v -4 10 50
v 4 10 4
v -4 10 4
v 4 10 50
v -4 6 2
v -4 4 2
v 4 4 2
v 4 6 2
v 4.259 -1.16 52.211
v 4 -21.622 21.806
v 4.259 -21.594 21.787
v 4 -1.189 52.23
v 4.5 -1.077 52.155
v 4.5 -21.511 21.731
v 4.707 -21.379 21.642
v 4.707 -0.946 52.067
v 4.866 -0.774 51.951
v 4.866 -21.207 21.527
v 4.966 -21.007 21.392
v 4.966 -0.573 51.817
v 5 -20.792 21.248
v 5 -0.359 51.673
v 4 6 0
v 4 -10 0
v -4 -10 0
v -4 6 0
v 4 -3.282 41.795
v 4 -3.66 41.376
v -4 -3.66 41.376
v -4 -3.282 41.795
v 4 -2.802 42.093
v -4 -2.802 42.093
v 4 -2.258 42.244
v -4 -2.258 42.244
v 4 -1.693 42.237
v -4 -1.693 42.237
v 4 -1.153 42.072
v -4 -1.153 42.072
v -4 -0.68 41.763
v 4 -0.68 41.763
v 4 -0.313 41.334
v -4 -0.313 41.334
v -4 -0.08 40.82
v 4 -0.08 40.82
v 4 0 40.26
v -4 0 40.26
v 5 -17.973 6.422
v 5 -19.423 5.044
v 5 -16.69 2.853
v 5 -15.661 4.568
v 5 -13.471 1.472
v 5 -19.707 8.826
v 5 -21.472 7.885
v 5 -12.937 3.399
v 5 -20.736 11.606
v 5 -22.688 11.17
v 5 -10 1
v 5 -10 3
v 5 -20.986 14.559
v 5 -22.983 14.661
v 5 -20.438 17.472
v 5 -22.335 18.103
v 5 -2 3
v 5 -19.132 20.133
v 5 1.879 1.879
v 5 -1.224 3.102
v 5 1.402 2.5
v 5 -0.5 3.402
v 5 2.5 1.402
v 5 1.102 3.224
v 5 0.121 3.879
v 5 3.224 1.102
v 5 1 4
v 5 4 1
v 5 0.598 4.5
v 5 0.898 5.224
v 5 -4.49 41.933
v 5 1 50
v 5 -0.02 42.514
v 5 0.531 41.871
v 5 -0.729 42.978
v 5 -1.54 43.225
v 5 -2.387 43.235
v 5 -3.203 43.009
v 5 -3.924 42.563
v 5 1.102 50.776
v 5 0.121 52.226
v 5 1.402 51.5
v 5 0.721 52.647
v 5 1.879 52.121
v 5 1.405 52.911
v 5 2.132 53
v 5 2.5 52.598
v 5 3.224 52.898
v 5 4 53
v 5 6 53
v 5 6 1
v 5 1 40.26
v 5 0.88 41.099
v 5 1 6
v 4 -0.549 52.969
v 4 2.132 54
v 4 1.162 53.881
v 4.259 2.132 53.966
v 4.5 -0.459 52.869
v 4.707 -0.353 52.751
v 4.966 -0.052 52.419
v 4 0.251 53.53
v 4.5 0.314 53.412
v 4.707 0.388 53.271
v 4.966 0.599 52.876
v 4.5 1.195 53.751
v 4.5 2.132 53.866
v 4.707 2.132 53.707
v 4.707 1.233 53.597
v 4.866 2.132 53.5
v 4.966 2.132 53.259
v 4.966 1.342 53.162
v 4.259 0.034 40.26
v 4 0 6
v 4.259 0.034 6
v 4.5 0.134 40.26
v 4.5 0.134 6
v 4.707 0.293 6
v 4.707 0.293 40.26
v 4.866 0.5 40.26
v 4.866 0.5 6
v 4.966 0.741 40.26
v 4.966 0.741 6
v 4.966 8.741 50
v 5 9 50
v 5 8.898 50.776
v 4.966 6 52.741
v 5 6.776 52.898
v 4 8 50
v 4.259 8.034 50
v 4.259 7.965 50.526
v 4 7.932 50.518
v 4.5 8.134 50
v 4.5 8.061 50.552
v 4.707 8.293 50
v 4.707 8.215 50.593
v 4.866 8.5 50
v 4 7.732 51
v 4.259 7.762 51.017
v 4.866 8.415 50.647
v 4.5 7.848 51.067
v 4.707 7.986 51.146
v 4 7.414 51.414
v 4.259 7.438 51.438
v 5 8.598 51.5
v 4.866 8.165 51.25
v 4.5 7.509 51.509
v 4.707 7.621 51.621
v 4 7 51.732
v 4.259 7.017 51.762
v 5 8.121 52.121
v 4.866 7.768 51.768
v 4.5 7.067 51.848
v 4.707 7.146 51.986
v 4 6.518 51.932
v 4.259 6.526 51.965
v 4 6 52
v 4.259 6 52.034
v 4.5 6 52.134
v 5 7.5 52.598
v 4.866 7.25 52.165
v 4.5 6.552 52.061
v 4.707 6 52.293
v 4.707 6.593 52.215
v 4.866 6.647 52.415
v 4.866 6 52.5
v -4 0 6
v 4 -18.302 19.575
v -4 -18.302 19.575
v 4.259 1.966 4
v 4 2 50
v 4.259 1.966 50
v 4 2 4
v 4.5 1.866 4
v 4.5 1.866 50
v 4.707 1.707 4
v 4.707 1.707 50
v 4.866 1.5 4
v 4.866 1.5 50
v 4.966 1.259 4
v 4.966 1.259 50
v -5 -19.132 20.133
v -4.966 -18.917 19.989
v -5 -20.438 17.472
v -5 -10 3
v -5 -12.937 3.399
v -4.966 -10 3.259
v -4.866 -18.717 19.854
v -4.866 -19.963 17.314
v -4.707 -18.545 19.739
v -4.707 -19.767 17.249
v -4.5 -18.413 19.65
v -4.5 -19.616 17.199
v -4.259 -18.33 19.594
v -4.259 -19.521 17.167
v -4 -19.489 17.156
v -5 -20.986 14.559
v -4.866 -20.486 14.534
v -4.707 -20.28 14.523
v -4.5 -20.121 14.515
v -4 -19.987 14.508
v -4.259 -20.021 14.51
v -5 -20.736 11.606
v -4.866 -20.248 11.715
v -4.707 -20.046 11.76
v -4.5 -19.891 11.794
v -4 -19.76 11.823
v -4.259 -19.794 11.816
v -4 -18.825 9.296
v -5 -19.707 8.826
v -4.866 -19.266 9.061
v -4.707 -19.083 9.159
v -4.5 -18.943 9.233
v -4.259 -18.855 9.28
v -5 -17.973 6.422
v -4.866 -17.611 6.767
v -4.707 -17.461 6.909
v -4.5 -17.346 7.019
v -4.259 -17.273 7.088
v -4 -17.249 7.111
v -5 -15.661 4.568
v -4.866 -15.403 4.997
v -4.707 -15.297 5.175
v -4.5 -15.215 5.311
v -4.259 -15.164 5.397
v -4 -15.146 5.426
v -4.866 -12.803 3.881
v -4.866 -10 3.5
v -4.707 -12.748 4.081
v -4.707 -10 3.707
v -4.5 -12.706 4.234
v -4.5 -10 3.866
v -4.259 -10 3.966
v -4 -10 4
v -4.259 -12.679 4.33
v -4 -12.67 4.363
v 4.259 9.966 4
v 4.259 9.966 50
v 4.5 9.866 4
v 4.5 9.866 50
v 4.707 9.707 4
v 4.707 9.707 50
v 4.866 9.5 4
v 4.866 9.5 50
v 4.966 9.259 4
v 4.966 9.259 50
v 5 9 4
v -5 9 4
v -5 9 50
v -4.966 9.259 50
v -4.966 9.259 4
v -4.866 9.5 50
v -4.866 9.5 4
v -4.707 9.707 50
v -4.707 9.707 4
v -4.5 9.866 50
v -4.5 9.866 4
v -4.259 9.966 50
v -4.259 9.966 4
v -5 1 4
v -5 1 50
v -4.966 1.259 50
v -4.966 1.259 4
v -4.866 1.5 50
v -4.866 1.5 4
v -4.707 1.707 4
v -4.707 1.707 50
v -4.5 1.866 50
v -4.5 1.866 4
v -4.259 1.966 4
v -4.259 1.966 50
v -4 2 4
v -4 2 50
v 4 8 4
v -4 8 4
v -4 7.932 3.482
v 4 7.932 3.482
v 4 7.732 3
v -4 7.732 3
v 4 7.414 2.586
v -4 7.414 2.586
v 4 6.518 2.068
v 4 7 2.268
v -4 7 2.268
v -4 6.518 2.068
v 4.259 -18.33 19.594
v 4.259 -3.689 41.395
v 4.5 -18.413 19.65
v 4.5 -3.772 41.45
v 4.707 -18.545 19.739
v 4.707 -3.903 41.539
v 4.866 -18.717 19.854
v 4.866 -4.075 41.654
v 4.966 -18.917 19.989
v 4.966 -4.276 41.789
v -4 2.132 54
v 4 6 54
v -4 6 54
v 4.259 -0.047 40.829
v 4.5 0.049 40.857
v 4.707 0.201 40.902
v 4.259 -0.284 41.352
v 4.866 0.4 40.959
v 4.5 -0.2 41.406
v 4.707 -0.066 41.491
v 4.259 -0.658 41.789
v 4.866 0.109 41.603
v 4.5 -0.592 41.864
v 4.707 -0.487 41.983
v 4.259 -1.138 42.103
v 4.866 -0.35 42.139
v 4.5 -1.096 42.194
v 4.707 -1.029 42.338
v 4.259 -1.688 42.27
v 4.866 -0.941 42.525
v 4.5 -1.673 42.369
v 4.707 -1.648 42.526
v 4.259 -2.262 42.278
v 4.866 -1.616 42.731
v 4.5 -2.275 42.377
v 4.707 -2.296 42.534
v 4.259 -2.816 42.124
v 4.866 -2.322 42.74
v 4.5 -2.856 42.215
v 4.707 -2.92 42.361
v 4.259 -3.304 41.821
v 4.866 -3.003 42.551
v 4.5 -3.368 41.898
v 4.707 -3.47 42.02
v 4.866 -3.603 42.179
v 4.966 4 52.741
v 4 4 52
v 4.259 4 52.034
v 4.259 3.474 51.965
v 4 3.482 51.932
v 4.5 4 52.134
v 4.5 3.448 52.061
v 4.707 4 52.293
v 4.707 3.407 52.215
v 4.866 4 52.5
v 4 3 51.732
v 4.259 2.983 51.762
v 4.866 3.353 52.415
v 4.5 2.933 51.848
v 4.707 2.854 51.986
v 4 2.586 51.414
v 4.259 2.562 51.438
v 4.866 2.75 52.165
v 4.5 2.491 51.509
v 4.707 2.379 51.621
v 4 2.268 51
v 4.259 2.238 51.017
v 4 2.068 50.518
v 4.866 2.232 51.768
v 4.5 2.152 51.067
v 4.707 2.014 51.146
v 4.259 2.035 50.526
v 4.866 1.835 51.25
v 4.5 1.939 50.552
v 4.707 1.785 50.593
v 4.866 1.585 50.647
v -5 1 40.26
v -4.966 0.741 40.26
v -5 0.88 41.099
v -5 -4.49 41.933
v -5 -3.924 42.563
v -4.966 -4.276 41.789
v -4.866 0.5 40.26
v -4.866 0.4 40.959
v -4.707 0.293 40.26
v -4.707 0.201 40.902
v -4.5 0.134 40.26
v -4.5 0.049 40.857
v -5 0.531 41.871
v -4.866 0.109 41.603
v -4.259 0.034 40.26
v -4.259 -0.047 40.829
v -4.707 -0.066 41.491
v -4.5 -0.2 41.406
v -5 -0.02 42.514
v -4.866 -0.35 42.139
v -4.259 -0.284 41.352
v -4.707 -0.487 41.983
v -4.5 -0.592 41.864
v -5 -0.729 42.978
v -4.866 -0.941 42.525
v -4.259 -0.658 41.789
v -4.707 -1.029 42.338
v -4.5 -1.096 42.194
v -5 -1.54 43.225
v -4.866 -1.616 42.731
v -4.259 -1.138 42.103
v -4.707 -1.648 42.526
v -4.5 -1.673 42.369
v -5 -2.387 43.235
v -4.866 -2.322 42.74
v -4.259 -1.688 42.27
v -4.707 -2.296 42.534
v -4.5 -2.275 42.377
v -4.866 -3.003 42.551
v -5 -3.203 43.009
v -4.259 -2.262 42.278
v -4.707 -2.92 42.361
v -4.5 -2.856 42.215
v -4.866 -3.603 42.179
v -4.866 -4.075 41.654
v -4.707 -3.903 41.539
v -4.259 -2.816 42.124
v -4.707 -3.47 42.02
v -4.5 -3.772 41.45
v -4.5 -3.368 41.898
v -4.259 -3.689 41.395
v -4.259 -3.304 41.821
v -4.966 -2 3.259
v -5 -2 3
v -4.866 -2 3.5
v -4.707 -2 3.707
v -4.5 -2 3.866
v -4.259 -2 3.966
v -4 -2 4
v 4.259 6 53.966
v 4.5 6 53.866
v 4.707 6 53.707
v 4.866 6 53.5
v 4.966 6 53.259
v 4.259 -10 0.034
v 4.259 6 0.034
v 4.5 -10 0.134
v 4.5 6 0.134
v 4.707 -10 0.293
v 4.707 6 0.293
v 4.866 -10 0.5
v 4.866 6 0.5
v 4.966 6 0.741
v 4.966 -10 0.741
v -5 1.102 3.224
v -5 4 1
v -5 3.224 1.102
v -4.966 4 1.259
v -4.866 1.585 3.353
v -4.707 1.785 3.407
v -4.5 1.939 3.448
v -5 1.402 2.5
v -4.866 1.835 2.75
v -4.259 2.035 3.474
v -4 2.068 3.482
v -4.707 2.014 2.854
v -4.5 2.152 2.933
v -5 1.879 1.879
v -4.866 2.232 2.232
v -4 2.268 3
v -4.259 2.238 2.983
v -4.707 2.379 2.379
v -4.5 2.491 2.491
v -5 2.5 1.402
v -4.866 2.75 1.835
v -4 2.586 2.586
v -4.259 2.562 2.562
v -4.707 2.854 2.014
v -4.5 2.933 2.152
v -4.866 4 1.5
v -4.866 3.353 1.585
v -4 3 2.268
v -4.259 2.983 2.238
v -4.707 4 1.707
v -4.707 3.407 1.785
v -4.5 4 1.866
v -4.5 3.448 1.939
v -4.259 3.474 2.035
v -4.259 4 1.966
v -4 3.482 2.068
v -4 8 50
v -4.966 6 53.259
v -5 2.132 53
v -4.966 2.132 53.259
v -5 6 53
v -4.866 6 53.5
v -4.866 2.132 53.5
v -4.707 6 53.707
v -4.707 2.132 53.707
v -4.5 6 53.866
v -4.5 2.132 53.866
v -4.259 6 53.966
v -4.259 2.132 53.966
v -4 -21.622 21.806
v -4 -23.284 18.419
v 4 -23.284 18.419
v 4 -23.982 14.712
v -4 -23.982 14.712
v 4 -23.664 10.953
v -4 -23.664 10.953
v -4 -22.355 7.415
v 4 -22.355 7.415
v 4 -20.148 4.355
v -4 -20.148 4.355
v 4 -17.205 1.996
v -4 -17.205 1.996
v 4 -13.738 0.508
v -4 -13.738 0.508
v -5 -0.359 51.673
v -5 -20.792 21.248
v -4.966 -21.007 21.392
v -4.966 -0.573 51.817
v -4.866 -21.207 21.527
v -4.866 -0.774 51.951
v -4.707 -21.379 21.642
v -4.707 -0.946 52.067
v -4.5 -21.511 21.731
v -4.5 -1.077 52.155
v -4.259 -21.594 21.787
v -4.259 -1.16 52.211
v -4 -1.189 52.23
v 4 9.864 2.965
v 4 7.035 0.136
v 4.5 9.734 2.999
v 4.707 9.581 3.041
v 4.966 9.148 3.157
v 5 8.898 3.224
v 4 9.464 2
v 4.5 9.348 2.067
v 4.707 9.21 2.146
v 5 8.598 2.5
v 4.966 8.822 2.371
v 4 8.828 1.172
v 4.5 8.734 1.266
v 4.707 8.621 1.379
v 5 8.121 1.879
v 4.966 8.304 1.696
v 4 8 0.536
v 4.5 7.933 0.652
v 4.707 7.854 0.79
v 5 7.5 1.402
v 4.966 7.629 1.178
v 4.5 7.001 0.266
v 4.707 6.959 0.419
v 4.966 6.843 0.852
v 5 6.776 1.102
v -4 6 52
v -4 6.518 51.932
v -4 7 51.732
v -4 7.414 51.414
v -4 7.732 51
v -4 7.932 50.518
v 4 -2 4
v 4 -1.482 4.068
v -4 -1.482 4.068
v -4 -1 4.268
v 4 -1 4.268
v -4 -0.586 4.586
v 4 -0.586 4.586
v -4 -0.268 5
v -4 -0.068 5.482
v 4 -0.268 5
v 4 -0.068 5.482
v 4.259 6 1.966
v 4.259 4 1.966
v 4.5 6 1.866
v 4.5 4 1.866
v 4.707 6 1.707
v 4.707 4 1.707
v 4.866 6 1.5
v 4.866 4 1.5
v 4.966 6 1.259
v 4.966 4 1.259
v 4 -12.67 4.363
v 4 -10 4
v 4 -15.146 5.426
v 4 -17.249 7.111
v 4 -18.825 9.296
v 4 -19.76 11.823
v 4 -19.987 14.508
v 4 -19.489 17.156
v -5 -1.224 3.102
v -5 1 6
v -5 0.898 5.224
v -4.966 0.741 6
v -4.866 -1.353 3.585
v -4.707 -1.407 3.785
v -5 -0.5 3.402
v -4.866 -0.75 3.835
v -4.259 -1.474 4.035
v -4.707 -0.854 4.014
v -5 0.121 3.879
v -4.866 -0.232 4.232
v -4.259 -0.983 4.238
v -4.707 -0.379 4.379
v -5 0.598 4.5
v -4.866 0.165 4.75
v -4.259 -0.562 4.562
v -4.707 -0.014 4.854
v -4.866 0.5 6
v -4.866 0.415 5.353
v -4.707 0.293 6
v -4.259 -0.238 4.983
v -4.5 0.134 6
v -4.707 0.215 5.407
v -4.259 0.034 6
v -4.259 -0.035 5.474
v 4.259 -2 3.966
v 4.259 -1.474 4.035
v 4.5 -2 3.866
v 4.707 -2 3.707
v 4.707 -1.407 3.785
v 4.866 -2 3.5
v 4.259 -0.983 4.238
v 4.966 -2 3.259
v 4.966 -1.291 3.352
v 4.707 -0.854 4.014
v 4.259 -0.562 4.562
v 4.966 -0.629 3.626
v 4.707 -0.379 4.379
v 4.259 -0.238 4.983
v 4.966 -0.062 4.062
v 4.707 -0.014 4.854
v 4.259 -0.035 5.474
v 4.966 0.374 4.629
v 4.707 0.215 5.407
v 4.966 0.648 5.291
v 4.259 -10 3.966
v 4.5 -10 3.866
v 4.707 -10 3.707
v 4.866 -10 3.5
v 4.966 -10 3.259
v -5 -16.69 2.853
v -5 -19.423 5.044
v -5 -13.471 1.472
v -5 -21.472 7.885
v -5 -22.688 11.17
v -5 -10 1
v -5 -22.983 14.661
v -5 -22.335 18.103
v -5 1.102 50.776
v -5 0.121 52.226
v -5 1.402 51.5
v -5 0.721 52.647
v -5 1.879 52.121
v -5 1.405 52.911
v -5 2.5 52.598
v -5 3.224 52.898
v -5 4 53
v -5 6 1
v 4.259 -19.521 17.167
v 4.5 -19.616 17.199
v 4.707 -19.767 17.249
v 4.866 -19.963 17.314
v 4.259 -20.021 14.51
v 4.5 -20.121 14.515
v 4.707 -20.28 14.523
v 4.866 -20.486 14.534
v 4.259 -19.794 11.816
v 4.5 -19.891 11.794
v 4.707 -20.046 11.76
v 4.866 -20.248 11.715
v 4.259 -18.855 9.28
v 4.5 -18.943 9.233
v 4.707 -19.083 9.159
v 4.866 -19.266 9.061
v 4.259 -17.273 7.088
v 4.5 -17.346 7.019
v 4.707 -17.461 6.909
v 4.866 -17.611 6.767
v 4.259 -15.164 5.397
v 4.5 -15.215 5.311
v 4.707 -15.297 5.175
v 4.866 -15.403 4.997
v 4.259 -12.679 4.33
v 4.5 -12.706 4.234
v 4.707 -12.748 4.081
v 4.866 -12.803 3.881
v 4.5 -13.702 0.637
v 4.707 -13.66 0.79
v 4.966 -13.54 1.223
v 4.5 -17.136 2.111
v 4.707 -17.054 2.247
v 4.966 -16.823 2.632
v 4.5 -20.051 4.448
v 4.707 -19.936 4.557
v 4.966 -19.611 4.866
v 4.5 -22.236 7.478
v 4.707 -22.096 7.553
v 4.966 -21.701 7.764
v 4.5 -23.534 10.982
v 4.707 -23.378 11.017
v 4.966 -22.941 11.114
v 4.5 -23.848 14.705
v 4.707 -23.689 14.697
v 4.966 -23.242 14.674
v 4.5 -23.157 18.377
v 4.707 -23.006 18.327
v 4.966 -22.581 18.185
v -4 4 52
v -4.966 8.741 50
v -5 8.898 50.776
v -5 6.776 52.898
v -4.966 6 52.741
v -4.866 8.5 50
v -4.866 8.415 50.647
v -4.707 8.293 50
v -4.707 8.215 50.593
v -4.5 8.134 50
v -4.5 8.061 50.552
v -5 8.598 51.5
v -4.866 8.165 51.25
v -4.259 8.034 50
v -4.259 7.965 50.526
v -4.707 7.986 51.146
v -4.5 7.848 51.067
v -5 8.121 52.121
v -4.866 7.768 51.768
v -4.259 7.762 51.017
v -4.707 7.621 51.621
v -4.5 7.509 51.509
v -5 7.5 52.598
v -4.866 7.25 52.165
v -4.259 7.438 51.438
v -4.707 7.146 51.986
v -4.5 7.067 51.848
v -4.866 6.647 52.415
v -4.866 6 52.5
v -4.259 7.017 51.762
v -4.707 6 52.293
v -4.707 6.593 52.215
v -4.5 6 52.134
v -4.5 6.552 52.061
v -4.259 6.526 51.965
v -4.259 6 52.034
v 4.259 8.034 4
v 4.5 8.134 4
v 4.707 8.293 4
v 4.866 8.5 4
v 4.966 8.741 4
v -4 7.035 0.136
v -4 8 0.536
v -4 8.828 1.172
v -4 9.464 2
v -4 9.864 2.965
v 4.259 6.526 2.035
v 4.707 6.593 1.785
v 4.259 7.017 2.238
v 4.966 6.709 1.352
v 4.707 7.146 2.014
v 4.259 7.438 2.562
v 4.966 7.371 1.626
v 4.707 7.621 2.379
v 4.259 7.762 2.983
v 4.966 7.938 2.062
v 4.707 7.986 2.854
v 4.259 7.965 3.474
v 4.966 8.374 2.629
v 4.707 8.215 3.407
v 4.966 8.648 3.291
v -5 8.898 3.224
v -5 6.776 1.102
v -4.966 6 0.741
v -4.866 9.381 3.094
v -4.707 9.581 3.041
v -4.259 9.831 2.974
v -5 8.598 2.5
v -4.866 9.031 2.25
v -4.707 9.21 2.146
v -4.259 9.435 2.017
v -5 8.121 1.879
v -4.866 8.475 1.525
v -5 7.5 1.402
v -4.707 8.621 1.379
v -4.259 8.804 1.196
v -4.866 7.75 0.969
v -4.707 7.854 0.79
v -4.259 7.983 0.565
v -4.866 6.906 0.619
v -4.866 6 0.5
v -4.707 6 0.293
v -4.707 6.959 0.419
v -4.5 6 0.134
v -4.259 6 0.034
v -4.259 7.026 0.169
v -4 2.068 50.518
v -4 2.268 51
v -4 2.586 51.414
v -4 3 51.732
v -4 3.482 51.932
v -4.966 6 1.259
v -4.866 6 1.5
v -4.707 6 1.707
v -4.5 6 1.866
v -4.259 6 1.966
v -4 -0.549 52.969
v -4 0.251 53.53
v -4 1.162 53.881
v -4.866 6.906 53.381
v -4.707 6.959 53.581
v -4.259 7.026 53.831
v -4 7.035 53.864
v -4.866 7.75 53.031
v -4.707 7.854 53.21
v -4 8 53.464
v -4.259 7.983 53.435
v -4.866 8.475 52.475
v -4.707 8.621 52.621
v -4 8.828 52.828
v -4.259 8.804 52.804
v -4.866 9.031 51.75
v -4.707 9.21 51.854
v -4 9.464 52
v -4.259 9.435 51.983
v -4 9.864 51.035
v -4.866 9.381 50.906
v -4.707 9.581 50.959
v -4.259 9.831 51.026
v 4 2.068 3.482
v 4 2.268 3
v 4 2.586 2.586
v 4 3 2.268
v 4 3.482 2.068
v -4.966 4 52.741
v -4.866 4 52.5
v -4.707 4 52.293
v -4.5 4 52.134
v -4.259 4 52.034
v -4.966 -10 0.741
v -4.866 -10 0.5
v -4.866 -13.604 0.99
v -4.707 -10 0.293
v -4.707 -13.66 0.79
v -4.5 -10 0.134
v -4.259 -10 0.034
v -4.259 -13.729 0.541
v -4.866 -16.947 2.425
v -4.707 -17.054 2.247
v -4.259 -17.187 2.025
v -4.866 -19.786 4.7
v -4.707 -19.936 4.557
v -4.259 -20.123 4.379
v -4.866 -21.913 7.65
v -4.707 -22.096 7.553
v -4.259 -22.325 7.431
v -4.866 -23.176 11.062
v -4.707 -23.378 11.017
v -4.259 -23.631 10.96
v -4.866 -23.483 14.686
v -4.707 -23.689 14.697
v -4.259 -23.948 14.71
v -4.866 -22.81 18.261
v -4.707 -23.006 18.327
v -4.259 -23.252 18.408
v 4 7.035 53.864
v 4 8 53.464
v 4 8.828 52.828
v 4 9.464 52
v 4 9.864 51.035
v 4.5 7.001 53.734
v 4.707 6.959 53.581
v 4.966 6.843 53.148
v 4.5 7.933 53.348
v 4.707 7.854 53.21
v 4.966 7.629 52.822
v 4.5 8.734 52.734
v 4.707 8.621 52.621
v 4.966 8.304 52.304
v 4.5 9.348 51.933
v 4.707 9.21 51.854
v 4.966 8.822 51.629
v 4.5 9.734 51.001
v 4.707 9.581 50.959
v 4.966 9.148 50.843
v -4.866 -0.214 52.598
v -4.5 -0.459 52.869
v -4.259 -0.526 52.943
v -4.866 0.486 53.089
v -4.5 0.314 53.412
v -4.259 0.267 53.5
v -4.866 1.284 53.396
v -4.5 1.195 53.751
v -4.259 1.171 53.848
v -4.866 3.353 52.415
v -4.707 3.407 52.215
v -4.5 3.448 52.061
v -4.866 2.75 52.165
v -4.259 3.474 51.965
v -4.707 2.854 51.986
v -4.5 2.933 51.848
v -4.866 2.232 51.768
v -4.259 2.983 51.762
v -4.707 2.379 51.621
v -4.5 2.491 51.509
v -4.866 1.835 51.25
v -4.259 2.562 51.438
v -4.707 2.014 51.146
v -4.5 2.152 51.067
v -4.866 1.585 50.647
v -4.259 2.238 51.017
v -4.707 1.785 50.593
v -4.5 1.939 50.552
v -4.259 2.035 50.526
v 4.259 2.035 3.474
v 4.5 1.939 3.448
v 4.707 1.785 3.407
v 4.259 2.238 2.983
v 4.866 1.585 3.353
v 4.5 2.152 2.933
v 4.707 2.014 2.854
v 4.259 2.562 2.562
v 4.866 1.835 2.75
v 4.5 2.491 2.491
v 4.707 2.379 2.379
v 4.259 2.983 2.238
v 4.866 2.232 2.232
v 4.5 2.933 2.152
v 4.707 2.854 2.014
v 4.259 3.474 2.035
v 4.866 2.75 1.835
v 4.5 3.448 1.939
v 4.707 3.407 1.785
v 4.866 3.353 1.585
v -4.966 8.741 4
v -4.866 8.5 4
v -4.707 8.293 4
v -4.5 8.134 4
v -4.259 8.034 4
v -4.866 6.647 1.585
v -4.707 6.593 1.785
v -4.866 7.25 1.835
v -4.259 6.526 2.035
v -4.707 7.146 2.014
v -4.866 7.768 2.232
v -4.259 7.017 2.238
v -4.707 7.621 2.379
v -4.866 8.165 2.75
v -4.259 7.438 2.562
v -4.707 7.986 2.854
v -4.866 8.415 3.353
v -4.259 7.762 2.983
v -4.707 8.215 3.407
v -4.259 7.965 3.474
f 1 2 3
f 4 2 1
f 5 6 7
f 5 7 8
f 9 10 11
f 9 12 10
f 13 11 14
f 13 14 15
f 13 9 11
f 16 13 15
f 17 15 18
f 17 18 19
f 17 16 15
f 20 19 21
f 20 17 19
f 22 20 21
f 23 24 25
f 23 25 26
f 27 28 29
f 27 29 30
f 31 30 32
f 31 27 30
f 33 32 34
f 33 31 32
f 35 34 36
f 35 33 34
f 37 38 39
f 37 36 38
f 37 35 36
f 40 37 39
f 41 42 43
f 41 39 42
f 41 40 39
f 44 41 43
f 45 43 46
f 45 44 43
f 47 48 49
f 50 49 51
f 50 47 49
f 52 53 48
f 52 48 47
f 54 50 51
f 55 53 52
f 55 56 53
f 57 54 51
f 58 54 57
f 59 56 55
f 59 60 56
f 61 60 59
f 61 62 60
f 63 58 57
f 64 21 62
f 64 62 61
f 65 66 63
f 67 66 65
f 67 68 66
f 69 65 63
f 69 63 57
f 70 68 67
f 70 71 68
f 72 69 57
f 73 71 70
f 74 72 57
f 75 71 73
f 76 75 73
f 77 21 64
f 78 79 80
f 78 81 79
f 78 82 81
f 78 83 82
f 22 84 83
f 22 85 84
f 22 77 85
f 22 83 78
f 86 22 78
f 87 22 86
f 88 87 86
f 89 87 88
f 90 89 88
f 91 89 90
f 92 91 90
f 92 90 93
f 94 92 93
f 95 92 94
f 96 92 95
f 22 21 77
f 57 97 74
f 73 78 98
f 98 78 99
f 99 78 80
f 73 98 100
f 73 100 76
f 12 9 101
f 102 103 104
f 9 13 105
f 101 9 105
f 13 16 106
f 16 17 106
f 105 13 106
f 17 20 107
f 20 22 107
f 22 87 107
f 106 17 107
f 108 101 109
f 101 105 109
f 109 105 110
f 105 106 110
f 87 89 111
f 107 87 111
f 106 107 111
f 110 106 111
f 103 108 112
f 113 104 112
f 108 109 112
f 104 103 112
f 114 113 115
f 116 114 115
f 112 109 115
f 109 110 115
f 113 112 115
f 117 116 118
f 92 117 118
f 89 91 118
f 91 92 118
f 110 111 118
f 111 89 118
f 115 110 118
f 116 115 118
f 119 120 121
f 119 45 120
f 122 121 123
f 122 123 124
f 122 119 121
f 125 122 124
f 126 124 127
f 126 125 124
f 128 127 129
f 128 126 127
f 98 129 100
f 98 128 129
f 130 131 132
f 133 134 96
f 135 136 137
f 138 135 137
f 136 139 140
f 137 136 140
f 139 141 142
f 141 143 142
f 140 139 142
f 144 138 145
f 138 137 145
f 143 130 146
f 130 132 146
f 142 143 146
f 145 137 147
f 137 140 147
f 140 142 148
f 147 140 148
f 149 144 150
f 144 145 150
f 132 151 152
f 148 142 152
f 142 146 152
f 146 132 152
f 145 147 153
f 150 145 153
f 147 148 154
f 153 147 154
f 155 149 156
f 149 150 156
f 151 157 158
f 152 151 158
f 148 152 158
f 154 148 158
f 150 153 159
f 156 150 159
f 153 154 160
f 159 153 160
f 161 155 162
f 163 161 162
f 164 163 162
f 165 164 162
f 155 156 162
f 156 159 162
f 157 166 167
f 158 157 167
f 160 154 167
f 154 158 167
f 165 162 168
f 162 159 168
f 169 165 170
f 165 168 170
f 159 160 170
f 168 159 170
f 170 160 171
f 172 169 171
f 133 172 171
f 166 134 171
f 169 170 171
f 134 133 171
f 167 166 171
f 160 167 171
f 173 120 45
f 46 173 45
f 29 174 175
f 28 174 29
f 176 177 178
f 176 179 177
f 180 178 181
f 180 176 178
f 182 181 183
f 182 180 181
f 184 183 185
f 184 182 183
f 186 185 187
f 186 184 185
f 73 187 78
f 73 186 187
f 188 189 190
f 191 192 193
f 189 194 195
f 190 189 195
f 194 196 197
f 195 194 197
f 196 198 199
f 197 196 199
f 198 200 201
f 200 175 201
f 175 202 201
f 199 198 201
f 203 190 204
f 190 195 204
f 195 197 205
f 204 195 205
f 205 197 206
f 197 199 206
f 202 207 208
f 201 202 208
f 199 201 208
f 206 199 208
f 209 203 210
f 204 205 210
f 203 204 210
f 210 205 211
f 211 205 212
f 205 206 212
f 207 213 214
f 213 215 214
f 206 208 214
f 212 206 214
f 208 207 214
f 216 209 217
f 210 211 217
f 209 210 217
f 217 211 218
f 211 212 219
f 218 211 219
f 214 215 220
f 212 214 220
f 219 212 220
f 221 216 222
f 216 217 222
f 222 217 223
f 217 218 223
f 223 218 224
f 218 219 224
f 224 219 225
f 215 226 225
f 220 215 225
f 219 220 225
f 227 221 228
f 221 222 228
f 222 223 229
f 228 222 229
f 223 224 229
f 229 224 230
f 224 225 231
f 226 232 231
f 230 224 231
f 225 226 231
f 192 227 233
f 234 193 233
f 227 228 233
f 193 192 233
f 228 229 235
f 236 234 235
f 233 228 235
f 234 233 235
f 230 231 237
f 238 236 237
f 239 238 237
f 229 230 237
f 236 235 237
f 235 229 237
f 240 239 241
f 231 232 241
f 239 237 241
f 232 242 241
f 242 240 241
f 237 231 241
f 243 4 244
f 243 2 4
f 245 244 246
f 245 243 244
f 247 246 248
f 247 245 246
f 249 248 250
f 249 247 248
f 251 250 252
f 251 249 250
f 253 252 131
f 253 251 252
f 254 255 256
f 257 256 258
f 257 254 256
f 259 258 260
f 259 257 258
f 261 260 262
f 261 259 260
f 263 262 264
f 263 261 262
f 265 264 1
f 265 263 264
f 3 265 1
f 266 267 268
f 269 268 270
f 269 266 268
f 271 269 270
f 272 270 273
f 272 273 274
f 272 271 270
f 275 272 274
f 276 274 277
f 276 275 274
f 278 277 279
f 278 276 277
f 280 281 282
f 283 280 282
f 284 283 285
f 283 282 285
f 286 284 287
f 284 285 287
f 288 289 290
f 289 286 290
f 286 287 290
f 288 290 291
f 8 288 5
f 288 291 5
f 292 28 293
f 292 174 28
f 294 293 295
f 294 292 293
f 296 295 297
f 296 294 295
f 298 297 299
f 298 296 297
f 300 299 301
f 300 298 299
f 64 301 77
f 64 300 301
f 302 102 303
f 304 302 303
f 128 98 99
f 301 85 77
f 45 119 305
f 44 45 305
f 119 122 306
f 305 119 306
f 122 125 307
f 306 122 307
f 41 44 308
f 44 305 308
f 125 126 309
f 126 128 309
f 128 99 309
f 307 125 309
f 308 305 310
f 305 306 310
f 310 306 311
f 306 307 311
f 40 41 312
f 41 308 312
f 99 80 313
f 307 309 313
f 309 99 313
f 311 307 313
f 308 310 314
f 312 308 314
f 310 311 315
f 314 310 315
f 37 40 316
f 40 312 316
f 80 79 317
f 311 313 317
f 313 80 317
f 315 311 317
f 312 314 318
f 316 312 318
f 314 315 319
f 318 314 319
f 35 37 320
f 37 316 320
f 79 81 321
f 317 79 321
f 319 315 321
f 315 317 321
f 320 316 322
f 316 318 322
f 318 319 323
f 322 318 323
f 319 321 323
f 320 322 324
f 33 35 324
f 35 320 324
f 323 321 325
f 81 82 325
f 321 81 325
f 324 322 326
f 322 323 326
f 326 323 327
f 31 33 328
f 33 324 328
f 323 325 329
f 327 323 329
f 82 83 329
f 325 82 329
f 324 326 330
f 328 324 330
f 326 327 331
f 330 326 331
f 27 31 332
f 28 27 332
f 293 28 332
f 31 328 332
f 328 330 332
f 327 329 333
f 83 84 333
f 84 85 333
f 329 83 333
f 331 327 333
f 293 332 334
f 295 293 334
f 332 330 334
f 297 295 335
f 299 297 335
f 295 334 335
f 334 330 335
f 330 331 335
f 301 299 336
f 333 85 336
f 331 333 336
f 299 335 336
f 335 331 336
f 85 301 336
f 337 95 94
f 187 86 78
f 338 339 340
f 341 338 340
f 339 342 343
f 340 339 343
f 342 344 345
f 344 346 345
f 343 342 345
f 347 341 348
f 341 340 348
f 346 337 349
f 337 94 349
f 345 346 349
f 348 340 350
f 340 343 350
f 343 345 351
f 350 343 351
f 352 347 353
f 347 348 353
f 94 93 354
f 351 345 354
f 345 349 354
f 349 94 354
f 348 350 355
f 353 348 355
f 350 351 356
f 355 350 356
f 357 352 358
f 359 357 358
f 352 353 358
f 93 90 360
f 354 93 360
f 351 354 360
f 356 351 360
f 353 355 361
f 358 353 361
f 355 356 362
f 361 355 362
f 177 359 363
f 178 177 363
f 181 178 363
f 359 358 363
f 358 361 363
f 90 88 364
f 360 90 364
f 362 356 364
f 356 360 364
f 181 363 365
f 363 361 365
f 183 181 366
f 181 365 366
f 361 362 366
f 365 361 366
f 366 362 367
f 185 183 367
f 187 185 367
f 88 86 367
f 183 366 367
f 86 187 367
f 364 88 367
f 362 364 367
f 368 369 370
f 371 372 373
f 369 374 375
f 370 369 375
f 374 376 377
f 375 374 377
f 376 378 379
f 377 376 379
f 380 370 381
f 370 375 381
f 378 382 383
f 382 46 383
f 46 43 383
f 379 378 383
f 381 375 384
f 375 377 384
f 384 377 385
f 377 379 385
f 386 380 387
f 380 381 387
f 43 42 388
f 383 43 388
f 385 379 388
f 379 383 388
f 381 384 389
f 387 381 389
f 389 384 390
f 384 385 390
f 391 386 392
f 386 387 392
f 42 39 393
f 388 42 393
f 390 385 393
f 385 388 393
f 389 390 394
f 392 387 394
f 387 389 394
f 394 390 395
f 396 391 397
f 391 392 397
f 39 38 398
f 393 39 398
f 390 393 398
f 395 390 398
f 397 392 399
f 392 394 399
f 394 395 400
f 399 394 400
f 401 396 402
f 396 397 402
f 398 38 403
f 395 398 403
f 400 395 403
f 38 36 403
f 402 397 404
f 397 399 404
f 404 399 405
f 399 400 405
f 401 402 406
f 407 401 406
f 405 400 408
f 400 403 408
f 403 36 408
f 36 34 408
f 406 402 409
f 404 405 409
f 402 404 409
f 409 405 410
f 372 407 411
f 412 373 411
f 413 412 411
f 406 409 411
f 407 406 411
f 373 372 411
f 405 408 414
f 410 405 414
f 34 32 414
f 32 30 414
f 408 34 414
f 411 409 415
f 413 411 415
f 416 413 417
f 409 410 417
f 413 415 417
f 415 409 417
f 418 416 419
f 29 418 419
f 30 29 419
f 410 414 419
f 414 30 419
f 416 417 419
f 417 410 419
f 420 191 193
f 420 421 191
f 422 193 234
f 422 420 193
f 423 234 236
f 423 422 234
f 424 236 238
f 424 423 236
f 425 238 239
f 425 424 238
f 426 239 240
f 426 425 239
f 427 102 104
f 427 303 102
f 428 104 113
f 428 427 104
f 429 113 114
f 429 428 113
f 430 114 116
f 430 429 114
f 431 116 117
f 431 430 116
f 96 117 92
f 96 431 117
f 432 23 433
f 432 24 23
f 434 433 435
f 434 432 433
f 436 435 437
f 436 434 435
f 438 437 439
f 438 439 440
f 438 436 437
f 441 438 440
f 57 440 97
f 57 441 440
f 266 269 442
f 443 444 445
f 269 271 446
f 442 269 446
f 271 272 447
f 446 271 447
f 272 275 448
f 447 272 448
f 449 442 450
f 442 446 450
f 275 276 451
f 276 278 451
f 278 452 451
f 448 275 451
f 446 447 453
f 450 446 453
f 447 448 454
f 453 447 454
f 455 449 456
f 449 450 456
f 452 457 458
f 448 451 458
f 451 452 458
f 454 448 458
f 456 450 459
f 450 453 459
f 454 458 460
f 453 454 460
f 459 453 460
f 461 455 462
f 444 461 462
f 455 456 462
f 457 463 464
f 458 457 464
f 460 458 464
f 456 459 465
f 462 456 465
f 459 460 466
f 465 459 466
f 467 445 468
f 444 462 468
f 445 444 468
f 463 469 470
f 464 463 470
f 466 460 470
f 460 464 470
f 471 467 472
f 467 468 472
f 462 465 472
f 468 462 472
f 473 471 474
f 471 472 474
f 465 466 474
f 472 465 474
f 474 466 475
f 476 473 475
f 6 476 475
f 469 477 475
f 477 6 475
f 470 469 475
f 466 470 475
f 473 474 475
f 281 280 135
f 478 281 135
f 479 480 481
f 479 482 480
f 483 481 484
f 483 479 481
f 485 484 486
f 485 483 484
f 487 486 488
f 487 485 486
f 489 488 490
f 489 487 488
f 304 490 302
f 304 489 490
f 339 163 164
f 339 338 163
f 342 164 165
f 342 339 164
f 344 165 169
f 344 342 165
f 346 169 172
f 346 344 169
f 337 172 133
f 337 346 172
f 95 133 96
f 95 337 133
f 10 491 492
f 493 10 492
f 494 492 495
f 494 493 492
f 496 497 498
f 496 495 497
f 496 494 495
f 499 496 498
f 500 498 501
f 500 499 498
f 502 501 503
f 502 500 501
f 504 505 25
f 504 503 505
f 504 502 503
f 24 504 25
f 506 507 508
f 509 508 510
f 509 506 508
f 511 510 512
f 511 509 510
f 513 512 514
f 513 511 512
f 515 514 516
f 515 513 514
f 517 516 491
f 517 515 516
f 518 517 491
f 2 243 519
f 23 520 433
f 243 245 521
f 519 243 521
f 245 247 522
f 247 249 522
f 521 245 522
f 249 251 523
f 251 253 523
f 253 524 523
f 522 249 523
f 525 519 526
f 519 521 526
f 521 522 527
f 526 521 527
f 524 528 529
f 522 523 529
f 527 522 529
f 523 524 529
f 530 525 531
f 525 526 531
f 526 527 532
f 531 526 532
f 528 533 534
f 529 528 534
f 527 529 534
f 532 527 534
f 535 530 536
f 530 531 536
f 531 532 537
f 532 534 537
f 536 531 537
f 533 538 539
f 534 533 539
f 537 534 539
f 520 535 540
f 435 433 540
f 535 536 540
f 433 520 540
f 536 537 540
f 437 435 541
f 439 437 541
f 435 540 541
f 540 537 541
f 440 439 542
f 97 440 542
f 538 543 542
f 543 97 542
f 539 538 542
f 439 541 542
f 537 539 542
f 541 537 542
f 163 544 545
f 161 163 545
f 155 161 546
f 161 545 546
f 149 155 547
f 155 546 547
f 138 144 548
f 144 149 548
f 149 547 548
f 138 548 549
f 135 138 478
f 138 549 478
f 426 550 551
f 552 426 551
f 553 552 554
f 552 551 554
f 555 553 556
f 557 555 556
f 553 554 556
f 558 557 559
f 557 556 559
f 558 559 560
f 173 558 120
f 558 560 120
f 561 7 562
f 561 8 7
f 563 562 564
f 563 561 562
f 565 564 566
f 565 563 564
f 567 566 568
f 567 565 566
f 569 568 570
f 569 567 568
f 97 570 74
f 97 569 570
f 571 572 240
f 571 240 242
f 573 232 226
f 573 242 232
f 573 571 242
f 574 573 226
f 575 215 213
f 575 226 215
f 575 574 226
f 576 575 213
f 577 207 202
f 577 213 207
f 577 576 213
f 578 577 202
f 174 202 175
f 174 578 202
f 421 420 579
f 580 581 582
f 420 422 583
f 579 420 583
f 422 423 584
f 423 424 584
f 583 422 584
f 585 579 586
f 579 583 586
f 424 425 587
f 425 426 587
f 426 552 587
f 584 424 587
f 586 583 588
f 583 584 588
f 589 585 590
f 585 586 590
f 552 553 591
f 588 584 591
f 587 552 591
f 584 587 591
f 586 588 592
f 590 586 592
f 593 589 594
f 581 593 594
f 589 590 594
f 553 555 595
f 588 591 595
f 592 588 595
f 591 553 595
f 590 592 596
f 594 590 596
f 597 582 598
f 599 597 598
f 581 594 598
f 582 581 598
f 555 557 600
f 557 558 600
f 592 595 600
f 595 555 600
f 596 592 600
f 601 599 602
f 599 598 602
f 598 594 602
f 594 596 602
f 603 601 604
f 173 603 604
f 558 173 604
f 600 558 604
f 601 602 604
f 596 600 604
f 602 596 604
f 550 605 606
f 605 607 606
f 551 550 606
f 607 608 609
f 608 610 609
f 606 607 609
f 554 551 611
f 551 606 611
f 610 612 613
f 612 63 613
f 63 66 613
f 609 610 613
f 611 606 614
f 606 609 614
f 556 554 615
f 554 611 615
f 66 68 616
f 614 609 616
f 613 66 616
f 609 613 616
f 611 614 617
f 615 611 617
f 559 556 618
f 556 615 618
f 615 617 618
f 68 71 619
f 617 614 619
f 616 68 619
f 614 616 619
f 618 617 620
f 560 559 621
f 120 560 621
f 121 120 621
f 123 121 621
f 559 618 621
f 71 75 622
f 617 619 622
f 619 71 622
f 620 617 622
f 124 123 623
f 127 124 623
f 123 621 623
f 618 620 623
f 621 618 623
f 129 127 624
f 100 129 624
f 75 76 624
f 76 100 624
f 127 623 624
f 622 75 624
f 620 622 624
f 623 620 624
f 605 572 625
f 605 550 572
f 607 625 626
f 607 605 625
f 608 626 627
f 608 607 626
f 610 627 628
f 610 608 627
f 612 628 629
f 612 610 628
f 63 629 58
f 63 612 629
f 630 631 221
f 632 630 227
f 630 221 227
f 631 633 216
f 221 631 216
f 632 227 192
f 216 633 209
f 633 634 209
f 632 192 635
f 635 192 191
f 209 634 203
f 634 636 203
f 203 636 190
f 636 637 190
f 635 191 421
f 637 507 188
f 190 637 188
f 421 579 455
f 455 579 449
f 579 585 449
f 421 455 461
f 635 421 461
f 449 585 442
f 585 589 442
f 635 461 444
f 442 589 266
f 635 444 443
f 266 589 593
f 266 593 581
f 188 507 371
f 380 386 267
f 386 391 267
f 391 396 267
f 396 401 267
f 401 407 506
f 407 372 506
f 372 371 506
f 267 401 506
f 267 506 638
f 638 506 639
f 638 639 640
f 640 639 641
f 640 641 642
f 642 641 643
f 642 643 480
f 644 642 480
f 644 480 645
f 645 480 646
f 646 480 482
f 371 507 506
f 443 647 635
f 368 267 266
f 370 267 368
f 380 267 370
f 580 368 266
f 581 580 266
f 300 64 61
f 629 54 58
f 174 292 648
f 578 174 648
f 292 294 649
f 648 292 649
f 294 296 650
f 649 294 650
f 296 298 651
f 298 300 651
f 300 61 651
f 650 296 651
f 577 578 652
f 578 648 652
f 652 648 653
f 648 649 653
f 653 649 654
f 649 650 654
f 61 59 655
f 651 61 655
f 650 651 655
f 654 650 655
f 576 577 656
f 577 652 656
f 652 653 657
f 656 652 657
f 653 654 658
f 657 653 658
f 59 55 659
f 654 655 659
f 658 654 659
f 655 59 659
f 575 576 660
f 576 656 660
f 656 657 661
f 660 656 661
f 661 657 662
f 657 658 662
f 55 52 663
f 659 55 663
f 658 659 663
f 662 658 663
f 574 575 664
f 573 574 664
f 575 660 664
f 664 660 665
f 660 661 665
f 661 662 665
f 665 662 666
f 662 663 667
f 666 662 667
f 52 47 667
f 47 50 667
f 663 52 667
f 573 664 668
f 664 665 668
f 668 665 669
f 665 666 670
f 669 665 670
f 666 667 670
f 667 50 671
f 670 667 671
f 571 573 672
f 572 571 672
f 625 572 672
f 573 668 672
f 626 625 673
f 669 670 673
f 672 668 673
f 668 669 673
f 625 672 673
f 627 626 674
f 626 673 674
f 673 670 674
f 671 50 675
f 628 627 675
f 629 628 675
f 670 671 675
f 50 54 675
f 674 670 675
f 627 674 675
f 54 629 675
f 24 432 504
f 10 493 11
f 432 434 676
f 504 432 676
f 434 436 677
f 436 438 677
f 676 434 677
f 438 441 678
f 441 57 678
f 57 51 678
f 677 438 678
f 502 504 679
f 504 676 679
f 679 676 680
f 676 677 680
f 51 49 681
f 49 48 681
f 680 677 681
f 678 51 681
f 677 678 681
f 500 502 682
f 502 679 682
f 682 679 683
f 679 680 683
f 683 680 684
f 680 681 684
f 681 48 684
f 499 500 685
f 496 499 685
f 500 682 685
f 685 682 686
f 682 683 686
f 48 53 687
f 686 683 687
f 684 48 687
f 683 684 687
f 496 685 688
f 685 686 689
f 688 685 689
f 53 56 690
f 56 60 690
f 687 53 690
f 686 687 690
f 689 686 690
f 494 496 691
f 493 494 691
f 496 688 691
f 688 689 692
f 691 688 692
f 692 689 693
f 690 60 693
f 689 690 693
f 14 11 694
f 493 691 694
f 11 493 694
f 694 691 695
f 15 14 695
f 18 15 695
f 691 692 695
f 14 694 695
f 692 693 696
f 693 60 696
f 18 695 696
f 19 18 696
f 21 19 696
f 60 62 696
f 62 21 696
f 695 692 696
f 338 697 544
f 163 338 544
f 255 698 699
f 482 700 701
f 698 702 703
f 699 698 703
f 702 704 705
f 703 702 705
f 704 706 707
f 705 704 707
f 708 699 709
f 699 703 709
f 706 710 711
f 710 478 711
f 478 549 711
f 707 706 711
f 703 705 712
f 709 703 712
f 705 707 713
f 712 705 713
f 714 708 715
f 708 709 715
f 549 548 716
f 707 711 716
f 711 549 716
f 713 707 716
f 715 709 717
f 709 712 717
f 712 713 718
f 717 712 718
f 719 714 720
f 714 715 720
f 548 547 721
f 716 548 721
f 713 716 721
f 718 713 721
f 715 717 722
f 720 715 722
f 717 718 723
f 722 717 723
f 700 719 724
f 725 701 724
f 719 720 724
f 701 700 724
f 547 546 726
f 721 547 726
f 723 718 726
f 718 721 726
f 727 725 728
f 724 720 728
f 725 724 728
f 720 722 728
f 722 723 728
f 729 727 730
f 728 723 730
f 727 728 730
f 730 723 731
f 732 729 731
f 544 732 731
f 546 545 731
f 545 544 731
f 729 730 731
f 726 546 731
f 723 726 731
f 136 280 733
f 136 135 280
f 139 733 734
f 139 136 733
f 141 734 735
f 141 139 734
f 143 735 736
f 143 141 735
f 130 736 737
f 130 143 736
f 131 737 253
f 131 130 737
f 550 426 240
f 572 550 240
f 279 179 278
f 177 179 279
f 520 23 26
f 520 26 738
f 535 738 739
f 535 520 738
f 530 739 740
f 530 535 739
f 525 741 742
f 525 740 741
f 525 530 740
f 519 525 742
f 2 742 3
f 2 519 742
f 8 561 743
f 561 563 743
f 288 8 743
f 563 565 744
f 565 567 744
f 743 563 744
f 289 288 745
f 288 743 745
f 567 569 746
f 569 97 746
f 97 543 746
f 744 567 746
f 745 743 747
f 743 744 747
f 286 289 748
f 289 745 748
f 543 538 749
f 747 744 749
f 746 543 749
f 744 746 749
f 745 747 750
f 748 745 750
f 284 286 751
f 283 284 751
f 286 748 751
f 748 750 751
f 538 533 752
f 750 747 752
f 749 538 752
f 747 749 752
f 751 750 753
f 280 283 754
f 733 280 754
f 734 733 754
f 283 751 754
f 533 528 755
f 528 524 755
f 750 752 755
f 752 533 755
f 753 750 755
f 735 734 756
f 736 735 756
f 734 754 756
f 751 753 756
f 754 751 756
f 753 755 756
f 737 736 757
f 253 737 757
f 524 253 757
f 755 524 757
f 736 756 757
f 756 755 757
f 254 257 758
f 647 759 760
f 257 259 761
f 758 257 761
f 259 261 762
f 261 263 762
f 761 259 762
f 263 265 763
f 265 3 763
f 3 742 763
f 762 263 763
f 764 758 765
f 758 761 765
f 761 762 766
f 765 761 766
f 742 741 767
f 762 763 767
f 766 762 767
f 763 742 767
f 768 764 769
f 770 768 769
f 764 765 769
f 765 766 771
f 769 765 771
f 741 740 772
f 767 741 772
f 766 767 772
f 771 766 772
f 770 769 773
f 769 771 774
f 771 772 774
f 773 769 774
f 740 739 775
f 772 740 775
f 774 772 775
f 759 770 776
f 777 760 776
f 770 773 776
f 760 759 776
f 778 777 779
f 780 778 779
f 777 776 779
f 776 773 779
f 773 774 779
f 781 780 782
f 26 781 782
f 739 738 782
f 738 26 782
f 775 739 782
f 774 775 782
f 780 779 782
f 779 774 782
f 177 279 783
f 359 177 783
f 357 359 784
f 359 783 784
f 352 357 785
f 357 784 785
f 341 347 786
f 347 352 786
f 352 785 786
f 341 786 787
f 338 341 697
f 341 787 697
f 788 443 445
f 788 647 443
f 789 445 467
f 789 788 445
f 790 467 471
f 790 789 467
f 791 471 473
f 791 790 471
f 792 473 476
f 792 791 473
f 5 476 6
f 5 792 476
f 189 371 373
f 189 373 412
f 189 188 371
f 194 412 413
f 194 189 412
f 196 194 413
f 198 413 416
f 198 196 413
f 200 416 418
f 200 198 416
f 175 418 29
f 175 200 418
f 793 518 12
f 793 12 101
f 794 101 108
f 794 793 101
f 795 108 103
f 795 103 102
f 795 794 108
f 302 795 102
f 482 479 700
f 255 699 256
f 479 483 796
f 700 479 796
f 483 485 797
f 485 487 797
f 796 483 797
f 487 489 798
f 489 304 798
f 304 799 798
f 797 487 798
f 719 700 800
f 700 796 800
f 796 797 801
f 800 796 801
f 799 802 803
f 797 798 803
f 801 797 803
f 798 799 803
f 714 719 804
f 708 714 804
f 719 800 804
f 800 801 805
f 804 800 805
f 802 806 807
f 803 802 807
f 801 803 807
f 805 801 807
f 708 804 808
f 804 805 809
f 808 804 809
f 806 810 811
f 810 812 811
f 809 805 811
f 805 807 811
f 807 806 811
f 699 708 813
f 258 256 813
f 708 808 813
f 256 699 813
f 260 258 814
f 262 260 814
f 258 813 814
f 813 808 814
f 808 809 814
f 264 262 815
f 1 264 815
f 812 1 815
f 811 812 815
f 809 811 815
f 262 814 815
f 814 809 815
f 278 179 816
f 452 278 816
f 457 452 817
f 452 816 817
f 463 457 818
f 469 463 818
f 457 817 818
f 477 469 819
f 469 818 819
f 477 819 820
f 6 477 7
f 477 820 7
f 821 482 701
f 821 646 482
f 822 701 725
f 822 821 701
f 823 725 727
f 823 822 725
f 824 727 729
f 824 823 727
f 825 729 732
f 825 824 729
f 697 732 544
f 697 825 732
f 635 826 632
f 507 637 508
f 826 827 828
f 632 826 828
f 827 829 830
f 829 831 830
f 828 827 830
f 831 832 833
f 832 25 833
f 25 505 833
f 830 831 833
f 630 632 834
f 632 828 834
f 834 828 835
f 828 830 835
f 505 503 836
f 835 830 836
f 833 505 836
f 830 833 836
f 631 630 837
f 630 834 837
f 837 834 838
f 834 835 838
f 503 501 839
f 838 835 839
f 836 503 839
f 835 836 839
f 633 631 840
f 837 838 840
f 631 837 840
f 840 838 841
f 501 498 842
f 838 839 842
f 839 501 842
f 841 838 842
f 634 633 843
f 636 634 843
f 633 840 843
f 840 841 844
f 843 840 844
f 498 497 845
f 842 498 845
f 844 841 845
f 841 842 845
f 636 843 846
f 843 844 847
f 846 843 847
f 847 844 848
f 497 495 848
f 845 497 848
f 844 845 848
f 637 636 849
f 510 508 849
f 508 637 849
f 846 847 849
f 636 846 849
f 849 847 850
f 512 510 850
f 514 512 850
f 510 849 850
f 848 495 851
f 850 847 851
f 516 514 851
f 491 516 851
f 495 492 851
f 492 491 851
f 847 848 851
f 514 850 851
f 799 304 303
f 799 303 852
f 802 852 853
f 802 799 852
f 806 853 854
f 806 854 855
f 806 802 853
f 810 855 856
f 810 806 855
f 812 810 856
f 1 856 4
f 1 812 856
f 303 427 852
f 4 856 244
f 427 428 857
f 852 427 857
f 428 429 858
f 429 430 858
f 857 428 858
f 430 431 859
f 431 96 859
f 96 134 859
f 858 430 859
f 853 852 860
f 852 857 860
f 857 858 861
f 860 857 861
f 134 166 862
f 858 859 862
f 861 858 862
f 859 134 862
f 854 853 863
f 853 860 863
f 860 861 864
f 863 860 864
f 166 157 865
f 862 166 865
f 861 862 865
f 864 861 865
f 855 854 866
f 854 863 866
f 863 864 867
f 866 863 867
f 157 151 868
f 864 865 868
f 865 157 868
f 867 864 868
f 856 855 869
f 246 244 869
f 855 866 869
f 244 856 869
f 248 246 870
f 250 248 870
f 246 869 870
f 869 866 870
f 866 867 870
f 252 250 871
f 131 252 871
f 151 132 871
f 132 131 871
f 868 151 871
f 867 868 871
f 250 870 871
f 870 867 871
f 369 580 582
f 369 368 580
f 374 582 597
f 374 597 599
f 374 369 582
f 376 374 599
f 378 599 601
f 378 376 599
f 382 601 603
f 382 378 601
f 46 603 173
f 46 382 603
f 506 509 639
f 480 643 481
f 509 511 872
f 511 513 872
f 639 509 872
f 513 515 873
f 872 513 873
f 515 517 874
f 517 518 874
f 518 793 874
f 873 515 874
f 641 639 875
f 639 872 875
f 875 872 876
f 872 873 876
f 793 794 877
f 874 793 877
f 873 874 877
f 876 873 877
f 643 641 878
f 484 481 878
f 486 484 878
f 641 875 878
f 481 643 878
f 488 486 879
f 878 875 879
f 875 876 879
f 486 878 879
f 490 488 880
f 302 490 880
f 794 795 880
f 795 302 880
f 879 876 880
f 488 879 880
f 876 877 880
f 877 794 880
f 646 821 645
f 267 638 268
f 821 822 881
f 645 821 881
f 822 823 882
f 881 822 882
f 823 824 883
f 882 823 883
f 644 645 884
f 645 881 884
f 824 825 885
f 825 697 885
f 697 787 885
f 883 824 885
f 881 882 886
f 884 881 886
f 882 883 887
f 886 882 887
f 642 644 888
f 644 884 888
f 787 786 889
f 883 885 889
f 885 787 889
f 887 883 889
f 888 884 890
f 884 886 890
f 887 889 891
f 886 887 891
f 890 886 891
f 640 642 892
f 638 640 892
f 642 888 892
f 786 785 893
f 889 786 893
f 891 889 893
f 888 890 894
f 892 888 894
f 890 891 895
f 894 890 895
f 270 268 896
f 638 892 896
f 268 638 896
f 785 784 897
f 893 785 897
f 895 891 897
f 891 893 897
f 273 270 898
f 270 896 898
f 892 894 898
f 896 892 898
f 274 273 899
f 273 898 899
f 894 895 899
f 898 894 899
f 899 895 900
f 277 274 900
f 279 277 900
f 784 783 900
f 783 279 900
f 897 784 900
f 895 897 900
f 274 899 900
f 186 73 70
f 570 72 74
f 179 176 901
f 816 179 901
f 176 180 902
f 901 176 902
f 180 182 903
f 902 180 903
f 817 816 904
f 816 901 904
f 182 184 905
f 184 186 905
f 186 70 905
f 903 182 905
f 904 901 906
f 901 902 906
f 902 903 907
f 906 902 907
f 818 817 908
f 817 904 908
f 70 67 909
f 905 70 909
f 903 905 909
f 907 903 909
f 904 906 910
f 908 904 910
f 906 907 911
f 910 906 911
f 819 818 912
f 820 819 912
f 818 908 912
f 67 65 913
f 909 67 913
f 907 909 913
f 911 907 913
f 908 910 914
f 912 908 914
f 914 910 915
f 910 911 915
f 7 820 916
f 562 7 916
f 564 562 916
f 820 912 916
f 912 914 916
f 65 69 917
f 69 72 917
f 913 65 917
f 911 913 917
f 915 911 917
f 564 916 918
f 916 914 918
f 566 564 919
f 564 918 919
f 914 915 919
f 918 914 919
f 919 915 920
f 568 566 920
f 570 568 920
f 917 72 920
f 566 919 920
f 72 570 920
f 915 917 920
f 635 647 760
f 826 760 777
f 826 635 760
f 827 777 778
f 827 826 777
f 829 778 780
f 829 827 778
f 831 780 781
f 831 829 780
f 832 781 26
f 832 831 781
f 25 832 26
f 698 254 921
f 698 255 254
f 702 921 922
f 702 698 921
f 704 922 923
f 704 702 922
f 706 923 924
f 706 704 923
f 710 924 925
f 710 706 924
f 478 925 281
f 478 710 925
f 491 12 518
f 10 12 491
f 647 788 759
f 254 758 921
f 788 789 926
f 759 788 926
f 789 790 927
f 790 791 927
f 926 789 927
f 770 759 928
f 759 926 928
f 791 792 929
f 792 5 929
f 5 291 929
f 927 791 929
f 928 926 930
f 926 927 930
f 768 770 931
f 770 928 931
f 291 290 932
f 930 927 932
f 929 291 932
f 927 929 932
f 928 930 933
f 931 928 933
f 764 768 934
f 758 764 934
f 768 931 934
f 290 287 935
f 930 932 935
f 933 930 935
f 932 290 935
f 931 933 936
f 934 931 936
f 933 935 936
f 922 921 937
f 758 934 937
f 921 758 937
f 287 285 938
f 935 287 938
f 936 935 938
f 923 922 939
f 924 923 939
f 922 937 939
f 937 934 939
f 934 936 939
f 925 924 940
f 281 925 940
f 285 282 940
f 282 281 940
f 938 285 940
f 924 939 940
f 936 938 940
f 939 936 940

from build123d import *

# Parameters (mm, degrees)
F2_W     = 10
F2_H     = 54
F2_W_2   = 6
F2_H_2   = 50
F3_DEPTH = 5
F5_DEPTH = 5
F6_R     = 4
F7_R     = 2
F8_R     = 0.99999


# Not quite as in the source:
# - a fillet or chamfer is up to 0.001 mm smaller than in the source, because OpenCascade refuses the exact size


with BuildPart() as f3:
    # F2 (on Right) → F3 (new body, symmetric)
    with BuildSketch(Plane.YZ):
        with Locations((5, 27)):
            Rectangle(F2_W, F2_H)
        with Locations((5, 27)):
            Rectangle(F2_W_2, F2_H_2, mode=Mode.SUBTRACT)
    extrude(amount=F3_DEPTH, both=True)

    # F4 (on Right) → F5 (join, symmetric)
    with BuildSketch(Plane.YZ):
        with BuildLine():
            Line((0, 0), (0, 4))
            Line((0, 4), (-10, 4))
            ThreePointArc((-10, 4), (-18.824788597, 9.2964793805), (-18.3015150257, 19.5753787564))
            Line((-18.3015150257, 19.5753787564), (0, 46.8255995247))
            Line((0, 46.8255995247), (0, 54))
            Line((0, 54), (-21.622121036, 21.805530259))
            ThreePointArc((-21.622121036, 21.805530259), (-22.3547040358, 7.4150711327), (-10, 0))
            Line((-10, 0), (0, 0))
        make_face()
    extrude(amount=F5_DEPTH, both=True)

    # F6
    f6_edges = [f3.edges().sort_by_distance(p)[0] for p in [
        (0, 10, 54),
        (0, 0, 54),
        (0, 10, 0),
    ]]
    fillet(f6_edges, radius=F6_R)

    # F7
    f7_edges = [f3.edges().sort_by_distance(p)[0] for p in [
        (0, 8, 52),
        (0, 2, 52),
        (0, 8, 2),
        (0, 2, 2),
        (0, 0, 4),
        (0, 0, 46.8256),
    ]]
    fillet(f7_edges, radius=F7_R)

    # F8 (radius 1 in the source; OpenCascade refuses exactly that, so slightly less here)
    f8_edges = [f3.edges().sort_by_distance(p)[0] for p in [
        (5, 0, 23.13024),
        (5, -1.417165, 42.173671),
        (5, -0.585786, 4.585786),
        (5, -10.980909, 30.475467),
        (5, -6, 4),
        (5, -18.824789, 9.296479),
        (5, 4.065979, 54),
        (5, 8.828427, 52.828427),
        (5, 0.25055, 53.529915),
        (5, 10, 27),
        (5, -11.405384, 37.017841),
        (5, 8.828427, 1.171573),
        (5, -22.354704, 7.415071),
        (5, -2, 0),
        (5, 8, 27),
        (5, 7.414214, 51.414214),
        (5, 7.414214, 2.585786),
        (5, 5, 52),
        (5, 5, 2),
        (5, 2.585786, 51.414214),
        (5, 2.585786, 2.585786),
        (5, 2, 27),
        (-5, 0, 23.13024),
        (-5, -1.417165, 42.173671),
        (-5, -0.585786, 4.585786),
        (-5, -10.980909, 30.475467),
        (-5, -6, 4),
        (-5, -18.824789, 9.296479),
        (-5, 4.065979, 54),
        (-5, 8.828427, 52.828427),
        (-5, 0.25055, 53.529915),
        (-5, 10, 27),
        (-5, -11.405384, 37.017841),
        (-5, 8.828427, 1.171573),
        (-5, -22.354704, 7.415071),
        (-5, -2, 0),
        (-5, 8, 27),
        (-5, 7.414214, 51.414214),
        (-5, 7.414214, 2.585786),
        (-5, 5, 52),
        (-5, 5, 2),
        (-5, 2.585786, 51.414214),
        (-5, 2.585786, 2.585786),
        (-5, 2, 27),
    ]]
    fillet(f8_edges, radius=F8_R)


solid = f3.part
